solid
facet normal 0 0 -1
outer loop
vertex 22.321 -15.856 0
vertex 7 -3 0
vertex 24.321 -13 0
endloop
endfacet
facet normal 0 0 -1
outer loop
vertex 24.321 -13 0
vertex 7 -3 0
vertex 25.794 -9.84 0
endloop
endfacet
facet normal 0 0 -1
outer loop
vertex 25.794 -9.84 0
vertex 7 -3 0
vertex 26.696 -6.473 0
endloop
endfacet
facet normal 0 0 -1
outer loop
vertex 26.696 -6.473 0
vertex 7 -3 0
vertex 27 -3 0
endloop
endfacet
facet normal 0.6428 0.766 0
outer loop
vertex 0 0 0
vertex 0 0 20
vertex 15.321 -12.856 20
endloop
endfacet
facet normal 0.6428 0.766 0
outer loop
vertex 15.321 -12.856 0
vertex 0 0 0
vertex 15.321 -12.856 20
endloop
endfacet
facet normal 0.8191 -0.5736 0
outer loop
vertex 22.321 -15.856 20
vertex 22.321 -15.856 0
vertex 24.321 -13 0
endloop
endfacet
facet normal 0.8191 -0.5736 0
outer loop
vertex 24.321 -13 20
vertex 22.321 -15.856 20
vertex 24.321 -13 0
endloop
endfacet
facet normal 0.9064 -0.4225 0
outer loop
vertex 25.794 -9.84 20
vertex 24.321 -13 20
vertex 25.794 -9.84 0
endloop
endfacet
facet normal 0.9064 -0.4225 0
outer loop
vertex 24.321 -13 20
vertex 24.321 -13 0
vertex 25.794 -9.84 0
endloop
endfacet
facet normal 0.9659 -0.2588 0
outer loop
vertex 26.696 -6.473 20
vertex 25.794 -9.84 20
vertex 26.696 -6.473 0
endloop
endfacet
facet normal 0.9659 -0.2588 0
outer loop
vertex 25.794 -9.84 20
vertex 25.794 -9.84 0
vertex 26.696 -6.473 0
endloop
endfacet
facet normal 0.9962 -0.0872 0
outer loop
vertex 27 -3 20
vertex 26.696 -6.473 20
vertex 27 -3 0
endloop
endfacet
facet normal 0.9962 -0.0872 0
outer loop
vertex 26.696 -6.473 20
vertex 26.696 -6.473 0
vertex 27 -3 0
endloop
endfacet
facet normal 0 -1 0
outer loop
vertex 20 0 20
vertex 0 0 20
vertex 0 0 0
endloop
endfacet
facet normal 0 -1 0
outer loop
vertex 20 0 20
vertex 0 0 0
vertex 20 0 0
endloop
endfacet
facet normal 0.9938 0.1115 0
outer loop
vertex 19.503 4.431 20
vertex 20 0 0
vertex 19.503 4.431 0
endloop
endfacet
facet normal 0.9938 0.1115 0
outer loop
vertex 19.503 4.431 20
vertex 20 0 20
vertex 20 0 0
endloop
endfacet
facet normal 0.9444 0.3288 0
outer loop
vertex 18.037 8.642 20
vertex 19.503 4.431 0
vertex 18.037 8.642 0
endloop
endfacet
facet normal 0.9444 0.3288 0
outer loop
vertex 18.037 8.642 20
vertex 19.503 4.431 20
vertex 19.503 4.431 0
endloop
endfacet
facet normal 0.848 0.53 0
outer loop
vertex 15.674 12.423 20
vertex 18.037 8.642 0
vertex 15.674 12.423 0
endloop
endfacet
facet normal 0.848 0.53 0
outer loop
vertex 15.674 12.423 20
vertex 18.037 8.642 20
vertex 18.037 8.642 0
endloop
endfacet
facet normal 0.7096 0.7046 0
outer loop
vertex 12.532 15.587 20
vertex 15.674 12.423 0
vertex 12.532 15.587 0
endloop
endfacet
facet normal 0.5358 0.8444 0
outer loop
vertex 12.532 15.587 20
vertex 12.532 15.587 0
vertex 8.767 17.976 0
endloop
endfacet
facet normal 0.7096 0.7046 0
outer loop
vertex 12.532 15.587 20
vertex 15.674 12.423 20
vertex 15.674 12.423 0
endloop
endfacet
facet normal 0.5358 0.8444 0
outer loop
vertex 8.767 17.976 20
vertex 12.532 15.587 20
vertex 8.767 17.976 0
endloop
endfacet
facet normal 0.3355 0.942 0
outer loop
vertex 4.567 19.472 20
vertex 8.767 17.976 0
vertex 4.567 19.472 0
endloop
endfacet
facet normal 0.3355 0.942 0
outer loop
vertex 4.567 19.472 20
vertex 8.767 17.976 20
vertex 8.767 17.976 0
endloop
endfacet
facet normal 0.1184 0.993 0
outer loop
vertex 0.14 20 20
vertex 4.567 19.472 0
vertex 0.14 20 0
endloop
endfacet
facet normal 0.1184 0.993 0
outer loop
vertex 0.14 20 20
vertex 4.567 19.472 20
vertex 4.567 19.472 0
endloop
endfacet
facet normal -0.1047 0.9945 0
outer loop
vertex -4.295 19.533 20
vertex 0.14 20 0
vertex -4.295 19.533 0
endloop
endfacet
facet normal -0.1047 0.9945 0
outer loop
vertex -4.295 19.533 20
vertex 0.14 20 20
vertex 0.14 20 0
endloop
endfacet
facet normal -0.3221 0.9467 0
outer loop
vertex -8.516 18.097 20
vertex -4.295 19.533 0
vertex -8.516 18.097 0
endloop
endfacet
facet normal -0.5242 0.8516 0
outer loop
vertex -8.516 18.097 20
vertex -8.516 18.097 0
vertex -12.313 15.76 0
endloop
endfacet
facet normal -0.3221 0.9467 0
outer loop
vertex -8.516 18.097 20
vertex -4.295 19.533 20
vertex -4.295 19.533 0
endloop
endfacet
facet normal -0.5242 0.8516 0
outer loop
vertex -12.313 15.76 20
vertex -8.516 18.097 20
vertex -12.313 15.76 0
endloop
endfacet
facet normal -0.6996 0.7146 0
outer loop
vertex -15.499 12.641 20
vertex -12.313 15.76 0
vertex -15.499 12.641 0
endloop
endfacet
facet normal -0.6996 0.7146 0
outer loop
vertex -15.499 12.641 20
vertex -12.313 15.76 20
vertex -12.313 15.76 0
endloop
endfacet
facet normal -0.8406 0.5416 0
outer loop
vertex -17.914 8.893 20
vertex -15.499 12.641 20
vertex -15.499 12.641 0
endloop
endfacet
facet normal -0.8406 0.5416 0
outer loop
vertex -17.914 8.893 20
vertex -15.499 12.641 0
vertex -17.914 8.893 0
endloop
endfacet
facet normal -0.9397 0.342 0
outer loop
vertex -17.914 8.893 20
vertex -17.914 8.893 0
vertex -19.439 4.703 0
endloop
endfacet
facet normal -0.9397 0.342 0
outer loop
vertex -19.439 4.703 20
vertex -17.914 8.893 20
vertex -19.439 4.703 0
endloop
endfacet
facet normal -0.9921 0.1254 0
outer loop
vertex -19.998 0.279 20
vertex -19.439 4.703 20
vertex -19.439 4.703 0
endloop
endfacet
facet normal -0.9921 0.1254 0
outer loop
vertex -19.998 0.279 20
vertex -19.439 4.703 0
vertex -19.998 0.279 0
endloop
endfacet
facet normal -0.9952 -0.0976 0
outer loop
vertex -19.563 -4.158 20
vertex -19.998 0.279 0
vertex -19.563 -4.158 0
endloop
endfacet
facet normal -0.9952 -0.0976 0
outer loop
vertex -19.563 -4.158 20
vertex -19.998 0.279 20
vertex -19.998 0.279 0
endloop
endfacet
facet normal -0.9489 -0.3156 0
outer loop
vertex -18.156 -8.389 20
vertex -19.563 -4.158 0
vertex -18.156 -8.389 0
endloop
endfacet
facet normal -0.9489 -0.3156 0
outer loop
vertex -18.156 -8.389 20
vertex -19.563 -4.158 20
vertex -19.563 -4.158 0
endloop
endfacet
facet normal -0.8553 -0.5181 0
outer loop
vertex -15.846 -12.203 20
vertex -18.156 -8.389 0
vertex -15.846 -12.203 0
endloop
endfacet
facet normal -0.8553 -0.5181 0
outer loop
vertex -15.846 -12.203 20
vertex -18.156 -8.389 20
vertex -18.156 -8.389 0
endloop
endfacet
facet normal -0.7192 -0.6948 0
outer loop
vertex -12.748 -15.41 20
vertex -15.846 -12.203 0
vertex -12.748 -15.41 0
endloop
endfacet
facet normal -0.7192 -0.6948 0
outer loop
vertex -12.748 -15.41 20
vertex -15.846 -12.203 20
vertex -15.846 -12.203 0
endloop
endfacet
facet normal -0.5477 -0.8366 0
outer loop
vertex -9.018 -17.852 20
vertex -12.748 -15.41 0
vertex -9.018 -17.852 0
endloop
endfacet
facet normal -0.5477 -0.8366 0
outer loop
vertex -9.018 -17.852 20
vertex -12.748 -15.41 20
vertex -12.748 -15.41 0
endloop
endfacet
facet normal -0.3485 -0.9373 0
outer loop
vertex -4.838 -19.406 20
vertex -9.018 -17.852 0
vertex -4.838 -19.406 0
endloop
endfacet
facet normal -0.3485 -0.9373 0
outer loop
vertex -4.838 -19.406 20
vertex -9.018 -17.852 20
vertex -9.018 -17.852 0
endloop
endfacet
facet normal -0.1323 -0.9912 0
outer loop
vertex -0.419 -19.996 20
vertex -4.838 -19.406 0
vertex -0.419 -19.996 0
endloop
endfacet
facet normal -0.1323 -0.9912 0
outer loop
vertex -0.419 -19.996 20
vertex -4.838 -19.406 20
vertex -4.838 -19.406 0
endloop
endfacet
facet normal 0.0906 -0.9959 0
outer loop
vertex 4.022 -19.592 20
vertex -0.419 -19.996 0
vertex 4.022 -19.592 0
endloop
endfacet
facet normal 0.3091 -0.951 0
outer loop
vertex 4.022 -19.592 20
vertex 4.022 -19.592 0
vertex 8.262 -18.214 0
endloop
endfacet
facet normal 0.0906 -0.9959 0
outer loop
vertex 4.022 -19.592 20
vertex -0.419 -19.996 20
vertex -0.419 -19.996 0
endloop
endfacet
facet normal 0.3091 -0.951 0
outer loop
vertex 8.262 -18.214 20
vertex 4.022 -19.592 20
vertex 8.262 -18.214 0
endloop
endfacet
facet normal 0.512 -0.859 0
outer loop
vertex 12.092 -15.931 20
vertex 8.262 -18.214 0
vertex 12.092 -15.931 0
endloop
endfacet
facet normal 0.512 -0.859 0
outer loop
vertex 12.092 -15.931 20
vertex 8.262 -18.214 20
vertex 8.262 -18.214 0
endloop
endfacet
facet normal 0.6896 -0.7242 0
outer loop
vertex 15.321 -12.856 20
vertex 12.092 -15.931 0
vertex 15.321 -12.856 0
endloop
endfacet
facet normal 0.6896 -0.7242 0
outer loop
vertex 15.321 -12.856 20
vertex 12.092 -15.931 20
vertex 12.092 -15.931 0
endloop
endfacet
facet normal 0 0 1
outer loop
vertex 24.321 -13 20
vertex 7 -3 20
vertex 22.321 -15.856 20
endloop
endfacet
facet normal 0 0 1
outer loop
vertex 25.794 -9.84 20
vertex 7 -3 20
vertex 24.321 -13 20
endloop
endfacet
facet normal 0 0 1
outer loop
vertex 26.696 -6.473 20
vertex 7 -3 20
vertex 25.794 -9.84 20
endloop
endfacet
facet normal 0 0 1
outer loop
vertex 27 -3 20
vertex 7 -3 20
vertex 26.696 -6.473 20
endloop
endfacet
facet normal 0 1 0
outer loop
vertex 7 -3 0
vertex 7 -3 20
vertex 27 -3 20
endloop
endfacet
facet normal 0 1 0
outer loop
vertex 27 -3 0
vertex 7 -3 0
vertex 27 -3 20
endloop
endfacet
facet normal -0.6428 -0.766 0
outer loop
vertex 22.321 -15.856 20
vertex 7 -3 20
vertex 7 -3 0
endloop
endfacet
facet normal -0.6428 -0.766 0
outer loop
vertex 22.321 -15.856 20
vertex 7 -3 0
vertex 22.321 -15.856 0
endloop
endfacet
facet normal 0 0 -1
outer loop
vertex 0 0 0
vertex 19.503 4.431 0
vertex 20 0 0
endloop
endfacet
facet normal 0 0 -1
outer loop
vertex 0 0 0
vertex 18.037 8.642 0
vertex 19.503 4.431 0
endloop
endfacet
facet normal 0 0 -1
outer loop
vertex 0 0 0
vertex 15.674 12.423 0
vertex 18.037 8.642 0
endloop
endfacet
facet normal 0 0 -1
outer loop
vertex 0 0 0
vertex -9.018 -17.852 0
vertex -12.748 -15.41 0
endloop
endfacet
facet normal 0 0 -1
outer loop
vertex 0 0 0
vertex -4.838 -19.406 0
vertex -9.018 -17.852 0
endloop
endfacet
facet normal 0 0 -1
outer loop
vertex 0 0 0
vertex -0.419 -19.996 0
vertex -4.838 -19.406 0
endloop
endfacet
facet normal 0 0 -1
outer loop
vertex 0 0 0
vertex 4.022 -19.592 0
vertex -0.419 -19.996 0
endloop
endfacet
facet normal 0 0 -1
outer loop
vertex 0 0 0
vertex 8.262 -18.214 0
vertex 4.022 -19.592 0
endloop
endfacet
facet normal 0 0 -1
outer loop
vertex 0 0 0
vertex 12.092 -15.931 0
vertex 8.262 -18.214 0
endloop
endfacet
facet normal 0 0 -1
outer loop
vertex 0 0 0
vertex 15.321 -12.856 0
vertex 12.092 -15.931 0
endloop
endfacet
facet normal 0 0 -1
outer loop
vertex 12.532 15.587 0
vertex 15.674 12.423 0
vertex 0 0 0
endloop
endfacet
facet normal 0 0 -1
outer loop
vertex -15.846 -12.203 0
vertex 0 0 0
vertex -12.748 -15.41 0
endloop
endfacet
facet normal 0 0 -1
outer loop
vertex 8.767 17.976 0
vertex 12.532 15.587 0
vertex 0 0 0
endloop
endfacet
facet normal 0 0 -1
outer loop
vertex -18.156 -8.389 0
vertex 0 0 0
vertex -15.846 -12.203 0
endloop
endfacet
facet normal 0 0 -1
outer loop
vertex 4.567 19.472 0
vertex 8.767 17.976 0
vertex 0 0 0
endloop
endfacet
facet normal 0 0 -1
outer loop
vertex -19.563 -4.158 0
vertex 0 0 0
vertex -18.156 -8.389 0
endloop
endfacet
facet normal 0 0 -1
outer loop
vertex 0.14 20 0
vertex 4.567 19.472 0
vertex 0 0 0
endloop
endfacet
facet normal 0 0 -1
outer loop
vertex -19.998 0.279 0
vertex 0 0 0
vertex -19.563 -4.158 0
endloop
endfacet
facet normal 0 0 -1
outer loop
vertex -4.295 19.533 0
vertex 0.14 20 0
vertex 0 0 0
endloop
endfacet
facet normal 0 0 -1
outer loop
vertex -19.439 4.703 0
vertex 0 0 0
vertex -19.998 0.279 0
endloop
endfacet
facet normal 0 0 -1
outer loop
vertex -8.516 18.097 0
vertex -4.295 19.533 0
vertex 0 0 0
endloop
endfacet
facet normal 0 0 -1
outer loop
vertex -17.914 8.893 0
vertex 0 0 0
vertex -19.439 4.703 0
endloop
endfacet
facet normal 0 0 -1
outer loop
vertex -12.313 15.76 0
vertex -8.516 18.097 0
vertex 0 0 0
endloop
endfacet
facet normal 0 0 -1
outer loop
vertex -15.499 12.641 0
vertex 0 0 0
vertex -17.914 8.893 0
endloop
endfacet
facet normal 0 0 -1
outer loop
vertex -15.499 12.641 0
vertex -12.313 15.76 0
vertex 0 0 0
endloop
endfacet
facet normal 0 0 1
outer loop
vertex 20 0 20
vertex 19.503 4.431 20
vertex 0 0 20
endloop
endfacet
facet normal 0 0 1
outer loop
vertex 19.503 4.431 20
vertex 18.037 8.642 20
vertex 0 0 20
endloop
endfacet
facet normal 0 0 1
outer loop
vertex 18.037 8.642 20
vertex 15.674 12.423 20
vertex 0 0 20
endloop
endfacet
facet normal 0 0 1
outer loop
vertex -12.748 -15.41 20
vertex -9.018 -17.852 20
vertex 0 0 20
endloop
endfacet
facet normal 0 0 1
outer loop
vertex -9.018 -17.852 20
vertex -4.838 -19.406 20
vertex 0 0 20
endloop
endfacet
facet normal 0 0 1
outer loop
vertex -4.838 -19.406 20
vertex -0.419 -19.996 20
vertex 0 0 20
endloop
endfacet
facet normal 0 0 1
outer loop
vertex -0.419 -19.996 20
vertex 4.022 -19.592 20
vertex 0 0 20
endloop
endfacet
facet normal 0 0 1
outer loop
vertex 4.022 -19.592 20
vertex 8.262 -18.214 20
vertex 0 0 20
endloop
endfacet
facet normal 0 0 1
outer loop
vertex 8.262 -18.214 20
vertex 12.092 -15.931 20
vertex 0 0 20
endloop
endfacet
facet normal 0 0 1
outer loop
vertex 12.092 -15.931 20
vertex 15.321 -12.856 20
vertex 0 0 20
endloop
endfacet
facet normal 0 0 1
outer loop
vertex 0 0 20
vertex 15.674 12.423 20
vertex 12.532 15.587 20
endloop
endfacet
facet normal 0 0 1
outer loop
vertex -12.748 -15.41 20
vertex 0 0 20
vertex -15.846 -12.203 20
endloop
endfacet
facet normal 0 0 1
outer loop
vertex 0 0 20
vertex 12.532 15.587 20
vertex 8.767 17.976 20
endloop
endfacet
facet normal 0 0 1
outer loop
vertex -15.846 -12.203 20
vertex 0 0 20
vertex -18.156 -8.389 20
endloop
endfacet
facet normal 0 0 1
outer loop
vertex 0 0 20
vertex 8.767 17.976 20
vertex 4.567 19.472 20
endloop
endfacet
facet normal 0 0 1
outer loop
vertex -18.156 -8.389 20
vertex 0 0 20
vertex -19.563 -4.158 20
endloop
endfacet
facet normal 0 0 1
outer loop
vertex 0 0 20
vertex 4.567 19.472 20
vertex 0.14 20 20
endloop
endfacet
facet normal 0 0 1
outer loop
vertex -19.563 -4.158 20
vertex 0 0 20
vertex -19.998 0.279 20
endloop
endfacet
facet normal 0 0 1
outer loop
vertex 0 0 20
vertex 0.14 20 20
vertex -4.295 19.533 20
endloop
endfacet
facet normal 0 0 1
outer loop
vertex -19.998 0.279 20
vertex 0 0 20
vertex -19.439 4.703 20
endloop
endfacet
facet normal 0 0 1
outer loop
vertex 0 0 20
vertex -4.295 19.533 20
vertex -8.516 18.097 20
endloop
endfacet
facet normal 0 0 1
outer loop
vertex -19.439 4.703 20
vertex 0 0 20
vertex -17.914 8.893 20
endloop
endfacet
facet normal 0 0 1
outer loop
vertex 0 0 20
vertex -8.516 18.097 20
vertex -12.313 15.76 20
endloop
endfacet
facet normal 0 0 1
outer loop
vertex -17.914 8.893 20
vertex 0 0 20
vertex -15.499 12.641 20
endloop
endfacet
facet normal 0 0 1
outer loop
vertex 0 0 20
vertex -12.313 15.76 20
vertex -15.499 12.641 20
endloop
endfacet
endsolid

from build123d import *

# Parameters (mm, degrees)
CYLINDER_W        = 20
CYLINDER_H        = 20
CYLINDER_ANGLE    = 320
CYLINDER001_W     = 20
CYLINDER001_H     = 20
CYLINDER001_ANGLE = 320
CYLINDER002_R     = 20
CYLINDER002_DEPTH = 20


with BuildPart() as tarta:
    # Cylinder → Cylinder (revolve)
    with BuildSketch(Plane.XZ):
        with Locations((10, 10)):
            Rectangle(CYLINDER_W, CYLINDER_H)
    revolve(axis=Axis((0, 0, 0), (0, 0, 1)), revolution_arc=CYLINDER_ANGLE)


with BuildPart() as tarta001:
    # Cylinder001 → Cylinder001 (revolve)
    with BuildSketch(Plane(origin=(7, -3, 0), x_dir=(1, 0, 0), z_dir=(0, -1, 0))):
        with Locations((10, 10)):
            Rectangle(CYLINDER001_W, CYLINDER001_H)
    revolve(axis=Axis((7, -3, 0), (0, 0, 1)), revolution_arc=CYLINDER001_ANGLE)


with BuildPart() as trozo:
    # Cylinder002 → Cylinder002 (new body)
    with BuildSketch(Plane(origin=(7, -3, 0), x_dir=(1, 0, 0), z_dir=(0, 0, 1))):
        Circle(CYLINDER002_R)
    extrude(amount=CYLINDER002_DEPTH)

    # Cut: cut tarta001
    add(tarta001.part, mode=Mode.SUBTRACT)


solid = Compound([tarta.part, trozo.part])
